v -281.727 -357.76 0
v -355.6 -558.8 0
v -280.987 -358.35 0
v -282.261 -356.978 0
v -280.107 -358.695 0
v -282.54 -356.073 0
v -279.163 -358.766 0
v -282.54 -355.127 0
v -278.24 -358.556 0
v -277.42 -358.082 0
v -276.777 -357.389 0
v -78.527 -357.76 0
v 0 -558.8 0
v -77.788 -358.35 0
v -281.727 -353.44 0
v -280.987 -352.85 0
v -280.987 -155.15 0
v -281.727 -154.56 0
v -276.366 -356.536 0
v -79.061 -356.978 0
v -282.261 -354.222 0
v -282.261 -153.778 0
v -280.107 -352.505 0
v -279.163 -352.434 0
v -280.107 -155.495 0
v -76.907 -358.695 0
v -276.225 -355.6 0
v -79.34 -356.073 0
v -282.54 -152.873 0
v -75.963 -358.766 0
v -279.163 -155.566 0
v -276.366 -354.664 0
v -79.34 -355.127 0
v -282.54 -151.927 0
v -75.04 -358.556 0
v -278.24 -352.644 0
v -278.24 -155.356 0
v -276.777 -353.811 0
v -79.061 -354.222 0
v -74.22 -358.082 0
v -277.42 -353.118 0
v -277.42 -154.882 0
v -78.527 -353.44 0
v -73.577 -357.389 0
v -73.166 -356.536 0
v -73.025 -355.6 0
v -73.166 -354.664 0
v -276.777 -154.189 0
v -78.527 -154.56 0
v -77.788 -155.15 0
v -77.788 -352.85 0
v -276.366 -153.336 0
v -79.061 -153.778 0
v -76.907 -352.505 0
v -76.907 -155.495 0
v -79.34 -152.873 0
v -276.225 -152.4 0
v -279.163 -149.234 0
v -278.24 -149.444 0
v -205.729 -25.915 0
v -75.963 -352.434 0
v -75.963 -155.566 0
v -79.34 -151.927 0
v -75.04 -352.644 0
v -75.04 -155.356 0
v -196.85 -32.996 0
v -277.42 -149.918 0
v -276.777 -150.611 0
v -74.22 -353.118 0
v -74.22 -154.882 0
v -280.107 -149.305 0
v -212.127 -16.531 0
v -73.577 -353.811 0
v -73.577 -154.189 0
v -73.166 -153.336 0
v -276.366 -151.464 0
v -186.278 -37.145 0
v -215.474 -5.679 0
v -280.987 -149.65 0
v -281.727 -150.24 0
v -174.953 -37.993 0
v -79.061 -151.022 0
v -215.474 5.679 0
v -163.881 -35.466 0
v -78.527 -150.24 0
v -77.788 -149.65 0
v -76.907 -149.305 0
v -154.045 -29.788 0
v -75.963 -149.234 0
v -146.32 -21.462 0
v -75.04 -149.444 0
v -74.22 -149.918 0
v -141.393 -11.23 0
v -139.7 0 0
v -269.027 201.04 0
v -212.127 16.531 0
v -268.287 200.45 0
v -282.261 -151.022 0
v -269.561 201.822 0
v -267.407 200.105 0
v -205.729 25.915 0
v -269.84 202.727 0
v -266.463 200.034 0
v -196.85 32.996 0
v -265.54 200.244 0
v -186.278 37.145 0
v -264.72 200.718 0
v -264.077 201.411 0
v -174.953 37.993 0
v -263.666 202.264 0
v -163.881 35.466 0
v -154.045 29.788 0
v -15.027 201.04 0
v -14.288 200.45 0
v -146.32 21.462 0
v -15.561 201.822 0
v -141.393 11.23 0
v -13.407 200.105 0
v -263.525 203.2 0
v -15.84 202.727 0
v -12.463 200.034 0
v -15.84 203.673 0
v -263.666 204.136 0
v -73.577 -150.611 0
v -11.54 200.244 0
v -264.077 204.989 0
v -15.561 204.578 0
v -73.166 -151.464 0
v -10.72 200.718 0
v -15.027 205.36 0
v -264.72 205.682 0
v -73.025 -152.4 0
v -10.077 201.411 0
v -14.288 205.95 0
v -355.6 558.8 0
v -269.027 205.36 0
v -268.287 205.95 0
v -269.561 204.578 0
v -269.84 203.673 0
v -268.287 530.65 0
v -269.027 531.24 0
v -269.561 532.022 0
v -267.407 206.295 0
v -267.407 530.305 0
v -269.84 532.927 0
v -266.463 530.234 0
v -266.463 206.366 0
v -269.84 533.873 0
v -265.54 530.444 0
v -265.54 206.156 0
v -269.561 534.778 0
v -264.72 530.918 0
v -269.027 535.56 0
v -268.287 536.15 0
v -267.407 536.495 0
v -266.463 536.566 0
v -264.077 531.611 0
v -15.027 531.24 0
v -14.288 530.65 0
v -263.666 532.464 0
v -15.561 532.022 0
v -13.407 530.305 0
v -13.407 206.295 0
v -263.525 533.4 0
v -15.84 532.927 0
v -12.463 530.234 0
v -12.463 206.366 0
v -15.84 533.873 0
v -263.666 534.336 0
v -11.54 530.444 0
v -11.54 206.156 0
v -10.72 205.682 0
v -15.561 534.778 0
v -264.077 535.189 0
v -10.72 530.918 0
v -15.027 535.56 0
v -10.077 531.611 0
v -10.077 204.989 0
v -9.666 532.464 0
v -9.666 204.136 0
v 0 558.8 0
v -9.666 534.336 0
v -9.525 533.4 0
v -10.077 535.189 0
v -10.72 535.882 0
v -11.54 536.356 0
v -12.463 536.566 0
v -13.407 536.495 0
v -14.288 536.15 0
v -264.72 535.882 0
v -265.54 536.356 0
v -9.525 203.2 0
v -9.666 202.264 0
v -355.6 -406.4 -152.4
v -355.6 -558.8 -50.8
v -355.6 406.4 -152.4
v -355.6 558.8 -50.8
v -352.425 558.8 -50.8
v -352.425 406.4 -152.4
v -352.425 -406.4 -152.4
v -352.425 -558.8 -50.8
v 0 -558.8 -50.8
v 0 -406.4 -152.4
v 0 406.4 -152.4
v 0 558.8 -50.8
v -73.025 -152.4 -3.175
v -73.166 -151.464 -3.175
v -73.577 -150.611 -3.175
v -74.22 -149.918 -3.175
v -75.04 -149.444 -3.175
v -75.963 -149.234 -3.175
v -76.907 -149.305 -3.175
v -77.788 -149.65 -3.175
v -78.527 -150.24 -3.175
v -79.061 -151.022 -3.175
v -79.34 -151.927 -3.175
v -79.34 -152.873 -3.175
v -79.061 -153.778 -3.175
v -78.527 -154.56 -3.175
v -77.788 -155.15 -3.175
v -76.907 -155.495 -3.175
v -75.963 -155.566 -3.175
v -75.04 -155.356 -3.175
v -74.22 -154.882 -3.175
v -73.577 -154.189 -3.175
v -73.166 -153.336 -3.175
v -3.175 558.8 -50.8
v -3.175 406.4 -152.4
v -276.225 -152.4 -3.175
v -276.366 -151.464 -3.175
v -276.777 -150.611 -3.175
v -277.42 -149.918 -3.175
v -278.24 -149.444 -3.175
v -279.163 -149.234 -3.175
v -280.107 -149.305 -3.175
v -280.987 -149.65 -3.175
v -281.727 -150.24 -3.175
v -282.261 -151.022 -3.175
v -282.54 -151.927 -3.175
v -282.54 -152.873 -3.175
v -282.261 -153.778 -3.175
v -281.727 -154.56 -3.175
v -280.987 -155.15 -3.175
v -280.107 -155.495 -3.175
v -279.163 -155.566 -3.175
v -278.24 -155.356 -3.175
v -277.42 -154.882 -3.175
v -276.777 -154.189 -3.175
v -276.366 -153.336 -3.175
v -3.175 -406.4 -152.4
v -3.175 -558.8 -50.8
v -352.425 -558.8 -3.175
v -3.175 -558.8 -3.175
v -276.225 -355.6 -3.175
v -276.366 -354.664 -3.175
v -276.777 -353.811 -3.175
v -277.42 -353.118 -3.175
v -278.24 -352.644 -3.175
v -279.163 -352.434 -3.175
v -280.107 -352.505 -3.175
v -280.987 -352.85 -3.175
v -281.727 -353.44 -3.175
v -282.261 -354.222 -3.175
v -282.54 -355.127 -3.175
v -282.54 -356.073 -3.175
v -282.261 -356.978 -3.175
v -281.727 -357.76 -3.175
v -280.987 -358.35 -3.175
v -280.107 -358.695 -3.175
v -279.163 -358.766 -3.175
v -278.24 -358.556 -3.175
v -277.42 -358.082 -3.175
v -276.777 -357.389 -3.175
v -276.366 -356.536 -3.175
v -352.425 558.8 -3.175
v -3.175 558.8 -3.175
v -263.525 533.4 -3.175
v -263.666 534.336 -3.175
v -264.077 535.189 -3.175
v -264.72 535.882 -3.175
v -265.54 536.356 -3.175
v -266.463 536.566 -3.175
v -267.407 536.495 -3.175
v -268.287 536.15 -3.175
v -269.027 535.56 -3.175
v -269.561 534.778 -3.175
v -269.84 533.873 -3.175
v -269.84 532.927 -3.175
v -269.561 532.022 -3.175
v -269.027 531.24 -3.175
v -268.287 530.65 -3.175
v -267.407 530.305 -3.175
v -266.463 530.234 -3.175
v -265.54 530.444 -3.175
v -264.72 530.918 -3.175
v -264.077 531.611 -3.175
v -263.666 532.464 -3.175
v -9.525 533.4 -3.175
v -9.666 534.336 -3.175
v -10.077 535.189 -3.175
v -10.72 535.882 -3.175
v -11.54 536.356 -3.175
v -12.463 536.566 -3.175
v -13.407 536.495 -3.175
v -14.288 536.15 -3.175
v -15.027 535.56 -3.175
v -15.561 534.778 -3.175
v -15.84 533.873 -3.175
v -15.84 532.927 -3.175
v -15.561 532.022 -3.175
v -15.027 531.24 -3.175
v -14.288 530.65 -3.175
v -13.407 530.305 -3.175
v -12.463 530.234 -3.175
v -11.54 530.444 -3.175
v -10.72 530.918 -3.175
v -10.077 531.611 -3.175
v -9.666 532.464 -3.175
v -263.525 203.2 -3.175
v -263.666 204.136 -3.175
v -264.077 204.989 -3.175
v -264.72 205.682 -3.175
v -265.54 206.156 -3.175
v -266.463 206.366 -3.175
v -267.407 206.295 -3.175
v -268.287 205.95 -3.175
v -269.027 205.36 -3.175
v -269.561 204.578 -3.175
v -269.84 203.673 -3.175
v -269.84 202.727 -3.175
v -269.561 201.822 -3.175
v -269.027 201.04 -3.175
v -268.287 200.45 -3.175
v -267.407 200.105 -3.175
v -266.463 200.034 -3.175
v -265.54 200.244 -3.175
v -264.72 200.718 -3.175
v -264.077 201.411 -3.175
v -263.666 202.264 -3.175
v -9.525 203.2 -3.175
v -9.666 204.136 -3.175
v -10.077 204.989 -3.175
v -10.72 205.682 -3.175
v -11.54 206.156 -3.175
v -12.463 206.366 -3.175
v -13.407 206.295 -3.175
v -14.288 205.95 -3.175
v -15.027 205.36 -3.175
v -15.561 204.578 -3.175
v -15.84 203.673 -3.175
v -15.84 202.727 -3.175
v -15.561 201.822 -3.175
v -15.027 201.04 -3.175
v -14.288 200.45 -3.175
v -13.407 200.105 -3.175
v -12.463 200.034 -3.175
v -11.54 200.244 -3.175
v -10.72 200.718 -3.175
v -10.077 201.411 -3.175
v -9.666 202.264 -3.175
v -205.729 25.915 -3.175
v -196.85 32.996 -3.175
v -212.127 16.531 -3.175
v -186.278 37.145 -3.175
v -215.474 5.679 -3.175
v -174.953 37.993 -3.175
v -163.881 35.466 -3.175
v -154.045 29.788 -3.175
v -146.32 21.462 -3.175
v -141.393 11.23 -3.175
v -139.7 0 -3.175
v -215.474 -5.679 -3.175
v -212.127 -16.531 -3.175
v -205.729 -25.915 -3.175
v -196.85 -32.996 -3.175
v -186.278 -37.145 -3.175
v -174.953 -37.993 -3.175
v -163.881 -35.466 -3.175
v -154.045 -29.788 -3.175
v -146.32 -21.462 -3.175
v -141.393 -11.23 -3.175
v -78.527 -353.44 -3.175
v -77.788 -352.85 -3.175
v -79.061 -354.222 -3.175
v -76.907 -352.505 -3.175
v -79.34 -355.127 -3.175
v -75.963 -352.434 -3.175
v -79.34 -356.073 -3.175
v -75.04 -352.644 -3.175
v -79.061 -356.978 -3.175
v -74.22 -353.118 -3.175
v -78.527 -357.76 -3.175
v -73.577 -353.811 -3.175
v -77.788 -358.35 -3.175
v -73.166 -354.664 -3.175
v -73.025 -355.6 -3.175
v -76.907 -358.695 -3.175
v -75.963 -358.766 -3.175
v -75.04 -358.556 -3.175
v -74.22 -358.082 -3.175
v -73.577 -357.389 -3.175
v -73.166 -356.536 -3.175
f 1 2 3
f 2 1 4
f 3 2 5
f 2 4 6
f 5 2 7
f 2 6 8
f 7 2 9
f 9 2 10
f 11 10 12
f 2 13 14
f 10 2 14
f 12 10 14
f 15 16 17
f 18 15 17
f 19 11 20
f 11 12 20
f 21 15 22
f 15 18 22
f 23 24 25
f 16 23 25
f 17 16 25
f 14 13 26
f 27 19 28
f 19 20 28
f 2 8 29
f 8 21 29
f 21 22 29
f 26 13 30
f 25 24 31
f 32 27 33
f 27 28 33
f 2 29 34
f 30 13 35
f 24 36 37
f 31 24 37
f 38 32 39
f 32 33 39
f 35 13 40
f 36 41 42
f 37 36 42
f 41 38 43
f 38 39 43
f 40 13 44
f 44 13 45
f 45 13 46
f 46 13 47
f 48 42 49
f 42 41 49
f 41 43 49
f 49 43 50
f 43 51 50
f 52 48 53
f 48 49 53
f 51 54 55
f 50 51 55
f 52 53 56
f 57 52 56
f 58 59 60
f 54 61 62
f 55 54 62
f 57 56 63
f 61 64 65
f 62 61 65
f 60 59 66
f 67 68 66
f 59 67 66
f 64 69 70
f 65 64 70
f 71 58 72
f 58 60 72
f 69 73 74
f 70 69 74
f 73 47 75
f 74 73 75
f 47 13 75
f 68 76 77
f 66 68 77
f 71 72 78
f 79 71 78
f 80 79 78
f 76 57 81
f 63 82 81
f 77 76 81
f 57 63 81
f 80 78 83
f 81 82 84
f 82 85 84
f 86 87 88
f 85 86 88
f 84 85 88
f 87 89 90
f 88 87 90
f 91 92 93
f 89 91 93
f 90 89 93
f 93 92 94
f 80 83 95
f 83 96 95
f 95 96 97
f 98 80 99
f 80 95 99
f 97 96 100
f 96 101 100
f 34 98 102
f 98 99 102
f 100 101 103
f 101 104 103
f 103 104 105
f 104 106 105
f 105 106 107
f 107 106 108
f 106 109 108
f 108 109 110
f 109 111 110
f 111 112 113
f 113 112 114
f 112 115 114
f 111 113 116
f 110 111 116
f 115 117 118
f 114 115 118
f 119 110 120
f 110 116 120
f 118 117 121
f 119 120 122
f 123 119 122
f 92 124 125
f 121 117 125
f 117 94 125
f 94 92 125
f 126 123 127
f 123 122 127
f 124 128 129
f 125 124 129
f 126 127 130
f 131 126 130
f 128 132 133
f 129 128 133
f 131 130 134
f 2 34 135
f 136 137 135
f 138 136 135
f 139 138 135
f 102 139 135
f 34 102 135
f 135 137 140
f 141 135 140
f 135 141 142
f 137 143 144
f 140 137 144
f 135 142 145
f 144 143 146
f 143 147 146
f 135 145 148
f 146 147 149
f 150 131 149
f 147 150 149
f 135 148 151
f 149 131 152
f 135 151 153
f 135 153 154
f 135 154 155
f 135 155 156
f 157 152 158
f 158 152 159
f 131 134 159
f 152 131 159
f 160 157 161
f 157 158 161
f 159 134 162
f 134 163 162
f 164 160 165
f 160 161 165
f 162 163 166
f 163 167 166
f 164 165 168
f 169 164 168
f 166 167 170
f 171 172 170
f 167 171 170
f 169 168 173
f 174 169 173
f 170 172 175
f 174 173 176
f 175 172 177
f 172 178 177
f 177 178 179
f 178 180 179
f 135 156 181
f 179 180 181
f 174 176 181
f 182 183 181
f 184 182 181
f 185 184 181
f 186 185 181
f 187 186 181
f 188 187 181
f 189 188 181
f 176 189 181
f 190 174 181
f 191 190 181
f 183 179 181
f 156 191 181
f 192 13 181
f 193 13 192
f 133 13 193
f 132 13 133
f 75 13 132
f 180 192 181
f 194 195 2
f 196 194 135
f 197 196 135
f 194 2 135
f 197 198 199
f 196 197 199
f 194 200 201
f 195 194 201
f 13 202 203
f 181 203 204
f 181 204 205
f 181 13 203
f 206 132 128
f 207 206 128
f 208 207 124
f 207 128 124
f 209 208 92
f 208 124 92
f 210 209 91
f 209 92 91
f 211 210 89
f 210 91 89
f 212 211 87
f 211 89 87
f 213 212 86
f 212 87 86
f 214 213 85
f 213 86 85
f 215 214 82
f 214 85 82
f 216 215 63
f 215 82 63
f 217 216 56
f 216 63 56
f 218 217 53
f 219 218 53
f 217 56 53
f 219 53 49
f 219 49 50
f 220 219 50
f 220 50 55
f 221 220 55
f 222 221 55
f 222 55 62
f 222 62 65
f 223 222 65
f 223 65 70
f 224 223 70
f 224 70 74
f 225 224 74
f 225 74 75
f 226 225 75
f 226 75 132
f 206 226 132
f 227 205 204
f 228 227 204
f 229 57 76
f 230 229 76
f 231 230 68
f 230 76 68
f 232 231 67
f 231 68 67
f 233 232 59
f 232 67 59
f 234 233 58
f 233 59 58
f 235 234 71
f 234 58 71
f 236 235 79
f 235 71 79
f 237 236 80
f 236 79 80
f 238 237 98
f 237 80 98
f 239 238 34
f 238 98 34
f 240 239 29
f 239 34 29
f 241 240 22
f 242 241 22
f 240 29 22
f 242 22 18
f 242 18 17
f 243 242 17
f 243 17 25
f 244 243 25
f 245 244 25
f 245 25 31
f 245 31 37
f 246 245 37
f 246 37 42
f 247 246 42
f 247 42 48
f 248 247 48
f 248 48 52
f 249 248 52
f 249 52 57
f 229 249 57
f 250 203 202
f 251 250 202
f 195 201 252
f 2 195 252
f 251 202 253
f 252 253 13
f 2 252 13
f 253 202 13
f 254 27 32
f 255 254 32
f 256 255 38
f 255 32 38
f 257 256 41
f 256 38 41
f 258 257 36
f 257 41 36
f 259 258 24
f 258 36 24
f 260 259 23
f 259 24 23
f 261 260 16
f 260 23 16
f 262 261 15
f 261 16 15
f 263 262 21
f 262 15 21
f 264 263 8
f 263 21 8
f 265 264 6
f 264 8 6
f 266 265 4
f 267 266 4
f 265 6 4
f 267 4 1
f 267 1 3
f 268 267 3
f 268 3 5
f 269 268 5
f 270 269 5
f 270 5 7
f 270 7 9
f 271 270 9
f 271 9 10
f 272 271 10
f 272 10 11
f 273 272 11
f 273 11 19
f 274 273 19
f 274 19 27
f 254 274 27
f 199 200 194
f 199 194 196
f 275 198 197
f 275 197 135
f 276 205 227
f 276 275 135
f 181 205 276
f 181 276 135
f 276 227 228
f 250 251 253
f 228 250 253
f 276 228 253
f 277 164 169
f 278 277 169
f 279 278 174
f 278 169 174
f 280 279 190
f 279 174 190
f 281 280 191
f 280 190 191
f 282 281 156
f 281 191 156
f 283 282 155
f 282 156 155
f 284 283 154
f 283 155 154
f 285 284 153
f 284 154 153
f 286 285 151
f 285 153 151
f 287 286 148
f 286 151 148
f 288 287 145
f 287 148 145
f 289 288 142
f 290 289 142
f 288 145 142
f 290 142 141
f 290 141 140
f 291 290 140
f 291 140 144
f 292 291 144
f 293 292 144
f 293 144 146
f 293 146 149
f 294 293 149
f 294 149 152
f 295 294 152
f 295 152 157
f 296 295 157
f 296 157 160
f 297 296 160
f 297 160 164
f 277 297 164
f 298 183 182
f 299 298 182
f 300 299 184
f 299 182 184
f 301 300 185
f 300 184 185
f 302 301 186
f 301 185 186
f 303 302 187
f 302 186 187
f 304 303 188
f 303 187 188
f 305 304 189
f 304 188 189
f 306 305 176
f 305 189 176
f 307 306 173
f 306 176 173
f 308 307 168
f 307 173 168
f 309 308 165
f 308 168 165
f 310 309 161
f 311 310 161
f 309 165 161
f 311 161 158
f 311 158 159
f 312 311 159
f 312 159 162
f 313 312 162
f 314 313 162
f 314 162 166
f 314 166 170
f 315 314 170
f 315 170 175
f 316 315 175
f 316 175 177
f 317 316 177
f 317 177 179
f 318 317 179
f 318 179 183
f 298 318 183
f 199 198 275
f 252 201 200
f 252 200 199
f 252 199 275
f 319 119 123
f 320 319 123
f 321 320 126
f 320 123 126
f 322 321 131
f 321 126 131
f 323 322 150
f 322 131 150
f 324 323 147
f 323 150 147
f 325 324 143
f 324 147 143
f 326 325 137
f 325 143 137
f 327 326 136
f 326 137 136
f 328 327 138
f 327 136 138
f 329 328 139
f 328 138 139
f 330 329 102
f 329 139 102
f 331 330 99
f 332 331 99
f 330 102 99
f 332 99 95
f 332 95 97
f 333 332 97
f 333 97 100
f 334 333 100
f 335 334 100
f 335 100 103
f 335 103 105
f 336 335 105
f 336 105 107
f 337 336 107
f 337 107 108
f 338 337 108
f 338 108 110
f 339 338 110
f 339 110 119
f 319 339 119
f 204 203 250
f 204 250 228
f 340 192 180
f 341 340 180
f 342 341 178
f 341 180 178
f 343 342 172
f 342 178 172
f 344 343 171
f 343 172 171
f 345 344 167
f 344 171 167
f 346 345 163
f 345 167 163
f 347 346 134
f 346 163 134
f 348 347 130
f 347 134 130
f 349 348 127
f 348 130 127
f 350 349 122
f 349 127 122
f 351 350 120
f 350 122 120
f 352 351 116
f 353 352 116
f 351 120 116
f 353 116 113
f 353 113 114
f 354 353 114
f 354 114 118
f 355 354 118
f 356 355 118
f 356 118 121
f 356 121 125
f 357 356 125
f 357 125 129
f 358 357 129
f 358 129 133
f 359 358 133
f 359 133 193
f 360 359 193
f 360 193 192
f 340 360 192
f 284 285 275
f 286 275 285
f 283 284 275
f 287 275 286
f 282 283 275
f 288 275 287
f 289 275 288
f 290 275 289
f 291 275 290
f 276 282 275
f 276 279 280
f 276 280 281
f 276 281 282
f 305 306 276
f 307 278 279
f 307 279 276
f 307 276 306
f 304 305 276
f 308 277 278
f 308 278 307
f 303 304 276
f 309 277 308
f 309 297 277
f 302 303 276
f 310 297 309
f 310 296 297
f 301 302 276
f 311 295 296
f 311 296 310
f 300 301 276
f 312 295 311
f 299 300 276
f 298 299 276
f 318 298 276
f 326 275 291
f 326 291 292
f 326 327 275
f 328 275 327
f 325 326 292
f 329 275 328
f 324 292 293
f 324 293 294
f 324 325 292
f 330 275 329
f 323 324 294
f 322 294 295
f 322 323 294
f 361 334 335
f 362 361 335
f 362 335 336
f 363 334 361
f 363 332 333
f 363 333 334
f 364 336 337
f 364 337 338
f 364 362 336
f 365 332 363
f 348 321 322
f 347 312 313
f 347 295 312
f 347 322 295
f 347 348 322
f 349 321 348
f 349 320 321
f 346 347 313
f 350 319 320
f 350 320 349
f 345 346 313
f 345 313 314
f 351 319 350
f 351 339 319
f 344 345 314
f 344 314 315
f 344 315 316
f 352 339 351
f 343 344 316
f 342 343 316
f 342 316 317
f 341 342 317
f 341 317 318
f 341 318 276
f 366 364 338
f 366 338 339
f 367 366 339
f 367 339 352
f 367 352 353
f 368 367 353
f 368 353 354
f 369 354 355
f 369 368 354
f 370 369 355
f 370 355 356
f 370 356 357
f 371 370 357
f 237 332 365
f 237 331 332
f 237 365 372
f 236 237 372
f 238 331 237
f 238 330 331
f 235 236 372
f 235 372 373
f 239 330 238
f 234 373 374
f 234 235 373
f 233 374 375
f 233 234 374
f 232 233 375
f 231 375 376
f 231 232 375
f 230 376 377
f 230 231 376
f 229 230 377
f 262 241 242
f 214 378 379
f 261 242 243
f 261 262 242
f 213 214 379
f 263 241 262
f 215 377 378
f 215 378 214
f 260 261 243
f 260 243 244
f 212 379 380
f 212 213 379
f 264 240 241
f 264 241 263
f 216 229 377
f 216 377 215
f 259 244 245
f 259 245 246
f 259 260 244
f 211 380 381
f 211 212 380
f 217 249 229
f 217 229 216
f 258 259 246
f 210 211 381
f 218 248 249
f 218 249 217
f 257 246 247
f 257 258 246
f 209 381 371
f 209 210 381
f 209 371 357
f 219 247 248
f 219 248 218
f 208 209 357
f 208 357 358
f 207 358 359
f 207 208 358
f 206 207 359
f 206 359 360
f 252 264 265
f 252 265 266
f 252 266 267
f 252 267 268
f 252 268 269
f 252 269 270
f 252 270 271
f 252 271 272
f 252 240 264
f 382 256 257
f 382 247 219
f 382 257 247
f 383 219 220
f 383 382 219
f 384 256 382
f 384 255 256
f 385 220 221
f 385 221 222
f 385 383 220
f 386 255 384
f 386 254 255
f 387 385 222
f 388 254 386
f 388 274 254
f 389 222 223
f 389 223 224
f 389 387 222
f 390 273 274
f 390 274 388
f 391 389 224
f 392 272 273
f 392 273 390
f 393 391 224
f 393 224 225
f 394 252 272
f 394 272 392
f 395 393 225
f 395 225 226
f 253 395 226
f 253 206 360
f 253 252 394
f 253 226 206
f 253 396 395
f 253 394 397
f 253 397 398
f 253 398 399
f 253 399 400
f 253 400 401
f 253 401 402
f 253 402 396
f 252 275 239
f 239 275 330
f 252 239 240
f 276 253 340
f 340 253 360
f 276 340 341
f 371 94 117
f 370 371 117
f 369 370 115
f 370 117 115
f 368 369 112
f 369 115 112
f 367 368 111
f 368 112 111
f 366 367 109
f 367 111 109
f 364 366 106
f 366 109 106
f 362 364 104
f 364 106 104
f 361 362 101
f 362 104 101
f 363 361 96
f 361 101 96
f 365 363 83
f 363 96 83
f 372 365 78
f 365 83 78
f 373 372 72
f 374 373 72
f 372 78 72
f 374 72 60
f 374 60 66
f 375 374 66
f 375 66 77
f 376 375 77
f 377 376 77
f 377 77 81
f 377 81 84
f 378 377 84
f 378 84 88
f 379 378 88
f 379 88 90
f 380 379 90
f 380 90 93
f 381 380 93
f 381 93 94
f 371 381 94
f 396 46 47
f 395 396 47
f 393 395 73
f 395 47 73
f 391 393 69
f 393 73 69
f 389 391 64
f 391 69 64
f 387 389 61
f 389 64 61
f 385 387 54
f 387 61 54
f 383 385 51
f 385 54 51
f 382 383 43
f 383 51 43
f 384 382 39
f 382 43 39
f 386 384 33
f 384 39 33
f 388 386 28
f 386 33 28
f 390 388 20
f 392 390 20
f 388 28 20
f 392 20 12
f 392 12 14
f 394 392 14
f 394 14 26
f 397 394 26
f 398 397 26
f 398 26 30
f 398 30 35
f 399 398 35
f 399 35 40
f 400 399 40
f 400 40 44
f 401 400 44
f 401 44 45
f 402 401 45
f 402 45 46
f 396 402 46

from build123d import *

# Parameters (mm, degrees)
F0_W     = 1117.6
F0_H     = 152.4
F1_DEPTH = 355.6
F2_W     = 349.25
F2_H     = 149.225
F3_DEPTH = 1117.601
F5_DEPTH = 355.601
F6_R     = 38.1
F6_R_2   = 3.175
F7_DEPTH = 152.401


with BuildPart() as f1:
    # F0 (on Right) → F1 (new body)
    with BuildSketch(Plane.YZ):
        with Locations((0, -76.2)):
            Rectangle(F0_W, F0_H)
    extrude(amount=-F1_DEPTH)

    # F2 (on face) → F3 (cut, through all)
    with BuildSketch(Plane.XZ.offset(558.8)):
        with Locations((-177.8, -77.7875)):
            Rectangle(F2_W, F2_H)
    extrude(amount=-F3_DEPTH, mode=Mode.SUBTRACT)

    # F4 (on face) → F5 (cut, through all)
    with BuildSketch(Plane.YZ):
        Polygon((-406.4, -152.4), (-558.8, -50.8), (-558.8, -152.4), align=None)
        Polygon((558.8, -152.4), (558.8, -50.8), (406.4, -152.4), align=None)
    extrude(amount=-F5_DEPTH, mode=Mode.SUBTRACT)

    # F6 (on face) → F7 (cut, through all)
    with BuildSketch(Plane.XY):
        with Locations((-177.8, 0)):
            Circle(F6_R)
        with Locations((-12.7, 203.2)):
            Circle(F6_R_2)
        with Locations((-266.7, 203.2)):
            Circle(F6_R_2)
        with Locations((-266.7, 533.4)):
            Circle(F6_R_2)
        with Locations((-12.7, 533.4)):
            Circle(F6_R_2)
        with Locations((-76.2, -355.6)):
            Circle(F6_R_2)
        with Locations((-76.2, -152.4)):
            Circle(F6_R_2)
        with Locations((-279.4, -152.4)):
            Circle(F6_R_2)
        with Locations((-279.4, -355.6)):
            Circle(F6_R_2)
    extrude(amount=-F7_DEPTH, mode=Mode.SUBTRACT)


solid = f1.part
